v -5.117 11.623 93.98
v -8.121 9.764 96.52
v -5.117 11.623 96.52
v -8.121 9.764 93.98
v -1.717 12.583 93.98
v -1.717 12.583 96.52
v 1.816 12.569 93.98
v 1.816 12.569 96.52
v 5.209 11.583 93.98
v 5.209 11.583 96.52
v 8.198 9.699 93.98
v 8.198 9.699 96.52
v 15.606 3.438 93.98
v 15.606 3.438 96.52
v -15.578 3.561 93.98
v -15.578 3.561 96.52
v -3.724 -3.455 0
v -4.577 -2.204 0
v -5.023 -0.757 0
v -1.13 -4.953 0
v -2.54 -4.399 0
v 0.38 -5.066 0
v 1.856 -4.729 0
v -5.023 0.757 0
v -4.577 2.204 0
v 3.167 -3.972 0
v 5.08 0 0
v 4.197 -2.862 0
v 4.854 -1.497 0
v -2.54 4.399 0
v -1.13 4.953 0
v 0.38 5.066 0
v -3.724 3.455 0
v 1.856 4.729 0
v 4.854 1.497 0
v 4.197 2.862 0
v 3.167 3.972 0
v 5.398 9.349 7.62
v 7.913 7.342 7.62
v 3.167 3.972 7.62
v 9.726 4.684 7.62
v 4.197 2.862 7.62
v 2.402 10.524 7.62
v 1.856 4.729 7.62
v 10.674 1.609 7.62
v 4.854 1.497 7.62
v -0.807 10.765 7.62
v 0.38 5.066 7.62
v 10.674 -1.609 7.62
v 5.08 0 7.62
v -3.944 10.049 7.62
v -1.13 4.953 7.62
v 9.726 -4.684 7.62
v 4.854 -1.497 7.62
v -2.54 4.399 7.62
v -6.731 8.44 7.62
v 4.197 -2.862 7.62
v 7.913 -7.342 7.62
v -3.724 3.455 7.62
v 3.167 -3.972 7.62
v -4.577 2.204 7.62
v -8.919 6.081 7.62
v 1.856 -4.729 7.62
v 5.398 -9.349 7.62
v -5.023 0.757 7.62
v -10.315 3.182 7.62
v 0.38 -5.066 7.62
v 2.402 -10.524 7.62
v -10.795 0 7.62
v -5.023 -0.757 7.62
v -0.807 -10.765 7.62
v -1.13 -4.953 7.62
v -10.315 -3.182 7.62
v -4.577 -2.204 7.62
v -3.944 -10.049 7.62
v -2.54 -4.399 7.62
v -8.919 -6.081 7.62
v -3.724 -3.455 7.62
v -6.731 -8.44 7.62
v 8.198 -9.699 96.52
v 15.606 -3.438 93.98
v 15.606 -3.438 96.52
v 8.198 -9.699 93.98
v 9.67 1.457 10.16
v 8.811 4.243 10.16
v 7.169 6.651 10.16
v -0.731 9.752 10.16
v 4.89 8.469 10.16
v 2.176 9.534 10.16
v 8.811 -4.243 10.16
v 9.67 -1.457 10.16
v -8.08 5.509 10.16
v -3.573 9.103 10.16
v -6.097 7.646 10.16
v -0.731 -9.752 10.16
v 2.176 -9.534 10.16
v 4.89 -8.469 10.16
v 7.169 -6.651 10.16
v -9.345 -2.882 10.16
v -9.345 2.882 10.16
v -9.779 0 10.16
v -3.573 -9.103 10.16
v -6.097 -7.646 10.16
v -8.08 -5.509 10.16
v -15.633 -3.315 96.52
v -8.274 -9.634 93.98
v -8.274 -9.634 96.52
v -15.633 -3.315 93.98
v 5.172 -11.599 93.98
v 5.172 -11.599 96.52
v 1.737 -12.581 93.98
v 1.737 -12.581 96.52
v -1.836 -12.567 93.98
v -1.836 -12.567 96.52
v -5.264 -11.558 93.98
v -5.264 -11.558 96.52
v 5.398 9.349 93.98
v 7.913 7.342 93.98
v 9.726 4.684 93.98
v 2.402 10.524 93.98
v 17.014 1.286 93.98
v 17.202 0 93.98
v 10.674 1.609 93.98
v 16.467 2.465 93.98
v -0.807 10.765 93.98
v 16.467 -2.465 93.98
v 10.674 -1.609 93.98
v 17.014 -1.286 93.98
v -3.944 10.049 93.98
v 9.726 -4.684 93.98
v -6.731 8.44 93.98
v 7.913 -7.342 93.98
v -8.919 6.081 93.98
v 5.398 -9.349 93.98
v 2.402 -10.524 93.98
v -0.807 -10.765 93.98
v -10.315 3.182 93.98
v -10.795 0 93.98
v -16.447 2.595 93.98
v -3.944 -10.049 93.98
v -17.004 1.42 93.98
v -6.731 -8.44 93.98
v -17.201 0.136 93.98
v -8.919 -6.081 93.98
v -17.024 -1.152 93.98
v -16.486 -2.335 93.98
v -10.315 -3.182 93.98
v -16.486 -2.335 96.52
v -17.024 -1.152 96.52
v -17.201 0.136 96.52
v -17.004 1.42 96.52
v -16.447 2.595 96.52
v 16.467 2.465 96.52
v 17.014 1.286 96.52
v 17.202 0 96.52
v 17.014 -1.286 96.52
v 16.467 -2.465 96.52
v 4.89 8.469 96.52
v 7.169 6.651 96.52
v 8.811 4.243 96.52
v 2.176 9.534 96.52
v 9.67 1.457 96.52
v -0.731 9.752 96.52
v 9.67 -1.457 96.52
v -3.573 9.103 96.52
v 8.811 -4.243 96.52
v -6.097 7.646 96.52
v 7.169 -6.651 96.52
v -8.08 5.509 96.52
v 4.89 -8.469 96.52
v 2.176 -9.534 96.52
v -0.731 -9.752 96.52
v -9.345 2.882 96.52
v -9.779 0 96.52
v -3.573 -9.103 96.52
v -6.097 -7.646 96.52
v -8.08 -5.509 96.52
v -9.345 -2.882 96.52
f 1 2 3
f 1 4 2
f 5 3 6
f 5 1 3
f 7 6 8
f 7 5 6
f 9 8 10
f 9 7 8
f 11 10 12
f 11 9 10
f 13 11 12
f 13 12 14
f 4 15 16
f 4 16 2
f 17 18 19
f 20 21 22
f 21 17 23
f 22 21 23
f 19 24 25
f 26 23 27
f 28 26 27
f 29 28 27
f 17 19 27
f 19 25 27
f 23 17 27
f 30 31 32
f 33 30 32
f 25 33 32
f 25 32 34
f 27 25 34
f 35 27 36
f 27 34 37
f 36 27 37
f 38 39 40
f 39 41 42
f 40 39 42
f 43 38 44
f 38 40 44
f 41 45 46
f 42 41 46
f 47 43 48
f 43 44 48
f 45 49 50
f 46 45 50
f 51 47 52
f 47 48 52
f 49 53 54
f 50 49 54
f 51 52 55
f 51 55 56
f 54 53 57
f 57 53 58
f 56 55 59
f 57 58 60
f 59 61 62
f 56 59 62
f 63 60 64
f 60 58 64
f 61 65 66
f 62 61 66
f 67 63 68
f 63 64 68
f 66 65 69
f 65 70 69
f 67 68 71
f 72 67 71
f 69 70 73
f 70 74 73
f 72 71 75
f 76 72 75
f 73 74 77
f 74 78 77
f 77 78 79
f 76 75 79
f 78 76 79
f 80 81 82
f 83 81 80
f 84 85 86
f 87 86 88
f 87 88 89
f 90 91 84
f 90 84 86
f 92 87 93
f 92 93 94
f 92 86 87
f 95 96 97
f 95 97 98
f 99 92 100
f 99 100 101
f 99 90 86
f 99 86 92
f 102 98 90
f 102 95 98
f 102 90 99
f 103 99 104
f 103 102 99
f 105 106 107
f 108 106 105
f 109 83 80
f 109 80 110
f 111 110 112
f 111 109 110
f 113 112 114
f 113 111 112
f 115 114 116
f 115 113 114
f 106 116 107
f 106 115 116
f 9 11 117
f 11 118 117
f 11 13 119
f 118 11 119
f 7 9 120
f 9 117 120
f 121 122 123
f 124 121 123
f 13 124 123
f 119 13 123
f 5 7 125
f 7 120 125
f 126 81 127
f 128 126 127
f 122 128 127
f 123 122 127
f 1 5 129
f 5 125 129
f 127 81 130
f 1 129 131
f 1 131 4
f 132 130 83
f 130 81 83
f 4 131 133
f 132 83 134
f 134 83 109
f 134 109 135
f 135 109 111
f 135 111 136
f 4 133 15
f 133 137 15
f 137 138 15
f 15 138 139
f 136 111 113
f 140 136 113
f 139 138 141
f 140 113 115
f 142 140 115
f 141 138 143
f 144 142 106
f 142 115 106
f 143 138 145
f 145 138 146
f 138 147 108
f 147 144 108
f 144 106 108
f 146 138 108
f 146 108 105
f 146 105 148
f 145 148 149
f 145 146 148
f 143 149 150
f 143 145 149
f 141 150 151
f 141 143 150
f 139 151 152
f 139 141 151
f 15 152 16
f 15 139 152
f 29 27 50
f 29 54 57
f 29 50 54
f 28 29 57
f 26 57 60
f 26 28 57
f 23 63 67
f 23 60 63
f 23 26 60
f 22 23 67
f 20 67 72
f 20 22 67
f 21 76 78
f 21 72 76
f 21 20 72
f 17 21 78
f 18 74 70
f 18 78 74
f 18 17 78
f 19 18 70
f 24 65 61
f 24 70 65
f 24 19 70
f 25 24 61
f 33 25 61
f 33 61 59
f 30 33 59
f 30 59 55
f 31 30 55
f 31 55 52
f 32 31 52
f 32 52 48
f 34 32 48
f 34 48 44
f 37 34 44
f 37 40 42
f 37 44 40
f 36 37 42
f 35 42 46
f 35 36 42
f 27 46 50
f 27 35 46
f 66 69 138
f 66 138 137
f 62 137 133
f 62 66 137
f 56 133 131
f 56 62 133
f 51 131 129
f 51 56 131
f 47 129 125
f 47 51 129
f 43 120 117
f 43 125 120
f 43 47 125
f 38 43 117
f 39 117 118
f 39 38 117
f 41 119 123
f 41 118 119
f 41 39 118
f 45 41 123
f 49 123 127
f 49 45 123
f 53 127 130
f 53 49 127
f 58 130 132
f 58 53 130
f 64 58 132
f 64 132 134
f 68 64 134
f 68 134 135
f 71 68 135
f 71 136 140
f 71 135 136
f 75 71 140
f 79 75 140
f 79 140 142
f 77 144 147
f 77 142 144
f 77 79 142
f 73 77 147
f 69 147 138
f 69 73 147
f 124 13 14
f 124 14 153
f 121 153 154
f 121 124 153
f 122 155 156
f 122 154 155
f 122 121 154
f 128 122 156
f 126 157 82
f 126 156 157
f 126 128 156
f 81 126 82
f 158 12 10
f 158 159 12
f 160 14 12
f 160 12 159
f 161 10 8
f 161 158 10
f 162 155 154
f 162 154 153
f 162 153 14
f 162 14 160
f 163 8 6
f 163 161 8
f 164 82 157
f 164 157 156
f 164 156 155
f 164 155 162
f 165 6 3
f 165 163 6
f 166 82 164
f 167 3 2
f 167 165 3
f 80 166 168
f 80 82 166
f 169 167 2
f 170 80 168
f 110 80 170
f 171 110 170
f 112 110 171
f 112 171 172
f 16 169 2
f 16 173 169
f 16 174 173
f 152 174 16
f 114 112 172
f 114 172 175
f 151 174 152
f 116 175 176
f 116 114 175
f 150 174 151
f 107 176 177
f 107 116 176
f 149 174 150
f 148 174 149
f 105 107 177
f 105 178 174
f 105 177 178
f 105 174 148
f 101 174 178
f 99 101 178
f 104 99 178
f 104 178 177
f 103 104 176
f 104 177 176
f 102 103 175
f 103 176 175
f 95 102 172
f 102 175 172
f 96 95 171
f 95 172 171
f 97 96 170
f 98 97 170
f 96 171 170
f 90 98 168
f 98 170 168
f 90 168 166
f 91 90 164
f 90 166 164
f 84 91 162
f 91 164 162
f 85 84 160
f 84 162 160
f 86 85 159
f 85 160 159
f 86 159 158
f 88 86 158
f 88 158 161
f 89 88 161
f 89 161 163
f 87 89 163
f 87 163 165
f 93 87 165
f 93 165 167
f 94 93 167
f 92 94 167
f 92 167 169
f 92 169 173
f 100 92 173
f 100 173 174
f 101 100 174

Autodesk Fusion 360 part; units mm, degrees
sketch "Sketch3" plane through (0, 0, 0) normal (0, 0, 1) x (1, 0, 0)
  circle A0 centre (0, 0) radius 5.08
  dimension "d5" = 10.16
extrude "Extrude2" add sketch "Sketch3" along normal blind 7.62
sketch "Sketch4" plane through (0, 0, 7.62) normal (0, 0, 1) x (-1, 0, 0)
  circle A0 centre (0, 0) radius 5.08
  circle A1 centre (0, 0) radius 10.795
  dimension "d8" = 21.59
extrude "Extrude3" add sketch "Sketch4" along normal blind 86.36 contours A0 | A1
sketch "Sketch7" plane through (0, 0, 93.98) normal (0, 0, 1) x (-1, 0, 0)
  circle A0 centre (0, 0) radius 10.795
  circle A1 centre (0, 0) radius 12.7
  circle A2 centre (-12.7, -0.0001) radius 4.5016
  circle A3 centre (12.6996, -0.1003) radius 4.5018
  line L0 (15.5784, -3.5613) -> (8.1213, -9.7639)
  line L1 (-8.1983, -9.6993) -> (-15.606, -3.4381)
  line L2 (-15.606, 3.4379) -> (-8.1984, 9.6993)
  line L3 (8.2745, 9.6344) -> (15.6327, 3.3149)
  circle A4 centre (0, 0) radius 12.7
  dimension "d14" = 25.4
extrude "Extrude4" add sketch "Sketch7" along normal blind 2.54
sketch "Sketch8" plane through (0, 0, 96.52) normal (0, 0, 1) x (-1, 0, 0)
  arc A0 (-15.606, 3.4379) -> (-15.606, -3.4381) centre (-12.7, -0.0001) ccw
  line L0 (-15.606, -3.4381) -> (-8.1983, -9.6993)
  arc A1 (-8.1983, -9.6993) -> (8.1213, -9.7639) centre (0, 0) ccw
  line L1 (8.1213, -9.7639) -> (15.5784, -3.5613)
  arc A2 (15.5784, -3.5613) -> (15.6327, 3.3149) centre (12.6996, -0.1003) ccw
  line L2 (15.6327, 3.3149) -> (8.2745, 9.6344)
  arc A3 (8.2745, 9.6344) -> (-8.1984, 9.6993) centre (0, 0) ccw
  line L3 (-8.1984, 9.6993) -> (-15.606, 3.4379)
  circle A4 centre (0, 0) radius 9.779
  dimension "d15" = 19.558
extrude "Extrude5" cut sketch "Sketch8" against normal blind 86.36 contours A4
